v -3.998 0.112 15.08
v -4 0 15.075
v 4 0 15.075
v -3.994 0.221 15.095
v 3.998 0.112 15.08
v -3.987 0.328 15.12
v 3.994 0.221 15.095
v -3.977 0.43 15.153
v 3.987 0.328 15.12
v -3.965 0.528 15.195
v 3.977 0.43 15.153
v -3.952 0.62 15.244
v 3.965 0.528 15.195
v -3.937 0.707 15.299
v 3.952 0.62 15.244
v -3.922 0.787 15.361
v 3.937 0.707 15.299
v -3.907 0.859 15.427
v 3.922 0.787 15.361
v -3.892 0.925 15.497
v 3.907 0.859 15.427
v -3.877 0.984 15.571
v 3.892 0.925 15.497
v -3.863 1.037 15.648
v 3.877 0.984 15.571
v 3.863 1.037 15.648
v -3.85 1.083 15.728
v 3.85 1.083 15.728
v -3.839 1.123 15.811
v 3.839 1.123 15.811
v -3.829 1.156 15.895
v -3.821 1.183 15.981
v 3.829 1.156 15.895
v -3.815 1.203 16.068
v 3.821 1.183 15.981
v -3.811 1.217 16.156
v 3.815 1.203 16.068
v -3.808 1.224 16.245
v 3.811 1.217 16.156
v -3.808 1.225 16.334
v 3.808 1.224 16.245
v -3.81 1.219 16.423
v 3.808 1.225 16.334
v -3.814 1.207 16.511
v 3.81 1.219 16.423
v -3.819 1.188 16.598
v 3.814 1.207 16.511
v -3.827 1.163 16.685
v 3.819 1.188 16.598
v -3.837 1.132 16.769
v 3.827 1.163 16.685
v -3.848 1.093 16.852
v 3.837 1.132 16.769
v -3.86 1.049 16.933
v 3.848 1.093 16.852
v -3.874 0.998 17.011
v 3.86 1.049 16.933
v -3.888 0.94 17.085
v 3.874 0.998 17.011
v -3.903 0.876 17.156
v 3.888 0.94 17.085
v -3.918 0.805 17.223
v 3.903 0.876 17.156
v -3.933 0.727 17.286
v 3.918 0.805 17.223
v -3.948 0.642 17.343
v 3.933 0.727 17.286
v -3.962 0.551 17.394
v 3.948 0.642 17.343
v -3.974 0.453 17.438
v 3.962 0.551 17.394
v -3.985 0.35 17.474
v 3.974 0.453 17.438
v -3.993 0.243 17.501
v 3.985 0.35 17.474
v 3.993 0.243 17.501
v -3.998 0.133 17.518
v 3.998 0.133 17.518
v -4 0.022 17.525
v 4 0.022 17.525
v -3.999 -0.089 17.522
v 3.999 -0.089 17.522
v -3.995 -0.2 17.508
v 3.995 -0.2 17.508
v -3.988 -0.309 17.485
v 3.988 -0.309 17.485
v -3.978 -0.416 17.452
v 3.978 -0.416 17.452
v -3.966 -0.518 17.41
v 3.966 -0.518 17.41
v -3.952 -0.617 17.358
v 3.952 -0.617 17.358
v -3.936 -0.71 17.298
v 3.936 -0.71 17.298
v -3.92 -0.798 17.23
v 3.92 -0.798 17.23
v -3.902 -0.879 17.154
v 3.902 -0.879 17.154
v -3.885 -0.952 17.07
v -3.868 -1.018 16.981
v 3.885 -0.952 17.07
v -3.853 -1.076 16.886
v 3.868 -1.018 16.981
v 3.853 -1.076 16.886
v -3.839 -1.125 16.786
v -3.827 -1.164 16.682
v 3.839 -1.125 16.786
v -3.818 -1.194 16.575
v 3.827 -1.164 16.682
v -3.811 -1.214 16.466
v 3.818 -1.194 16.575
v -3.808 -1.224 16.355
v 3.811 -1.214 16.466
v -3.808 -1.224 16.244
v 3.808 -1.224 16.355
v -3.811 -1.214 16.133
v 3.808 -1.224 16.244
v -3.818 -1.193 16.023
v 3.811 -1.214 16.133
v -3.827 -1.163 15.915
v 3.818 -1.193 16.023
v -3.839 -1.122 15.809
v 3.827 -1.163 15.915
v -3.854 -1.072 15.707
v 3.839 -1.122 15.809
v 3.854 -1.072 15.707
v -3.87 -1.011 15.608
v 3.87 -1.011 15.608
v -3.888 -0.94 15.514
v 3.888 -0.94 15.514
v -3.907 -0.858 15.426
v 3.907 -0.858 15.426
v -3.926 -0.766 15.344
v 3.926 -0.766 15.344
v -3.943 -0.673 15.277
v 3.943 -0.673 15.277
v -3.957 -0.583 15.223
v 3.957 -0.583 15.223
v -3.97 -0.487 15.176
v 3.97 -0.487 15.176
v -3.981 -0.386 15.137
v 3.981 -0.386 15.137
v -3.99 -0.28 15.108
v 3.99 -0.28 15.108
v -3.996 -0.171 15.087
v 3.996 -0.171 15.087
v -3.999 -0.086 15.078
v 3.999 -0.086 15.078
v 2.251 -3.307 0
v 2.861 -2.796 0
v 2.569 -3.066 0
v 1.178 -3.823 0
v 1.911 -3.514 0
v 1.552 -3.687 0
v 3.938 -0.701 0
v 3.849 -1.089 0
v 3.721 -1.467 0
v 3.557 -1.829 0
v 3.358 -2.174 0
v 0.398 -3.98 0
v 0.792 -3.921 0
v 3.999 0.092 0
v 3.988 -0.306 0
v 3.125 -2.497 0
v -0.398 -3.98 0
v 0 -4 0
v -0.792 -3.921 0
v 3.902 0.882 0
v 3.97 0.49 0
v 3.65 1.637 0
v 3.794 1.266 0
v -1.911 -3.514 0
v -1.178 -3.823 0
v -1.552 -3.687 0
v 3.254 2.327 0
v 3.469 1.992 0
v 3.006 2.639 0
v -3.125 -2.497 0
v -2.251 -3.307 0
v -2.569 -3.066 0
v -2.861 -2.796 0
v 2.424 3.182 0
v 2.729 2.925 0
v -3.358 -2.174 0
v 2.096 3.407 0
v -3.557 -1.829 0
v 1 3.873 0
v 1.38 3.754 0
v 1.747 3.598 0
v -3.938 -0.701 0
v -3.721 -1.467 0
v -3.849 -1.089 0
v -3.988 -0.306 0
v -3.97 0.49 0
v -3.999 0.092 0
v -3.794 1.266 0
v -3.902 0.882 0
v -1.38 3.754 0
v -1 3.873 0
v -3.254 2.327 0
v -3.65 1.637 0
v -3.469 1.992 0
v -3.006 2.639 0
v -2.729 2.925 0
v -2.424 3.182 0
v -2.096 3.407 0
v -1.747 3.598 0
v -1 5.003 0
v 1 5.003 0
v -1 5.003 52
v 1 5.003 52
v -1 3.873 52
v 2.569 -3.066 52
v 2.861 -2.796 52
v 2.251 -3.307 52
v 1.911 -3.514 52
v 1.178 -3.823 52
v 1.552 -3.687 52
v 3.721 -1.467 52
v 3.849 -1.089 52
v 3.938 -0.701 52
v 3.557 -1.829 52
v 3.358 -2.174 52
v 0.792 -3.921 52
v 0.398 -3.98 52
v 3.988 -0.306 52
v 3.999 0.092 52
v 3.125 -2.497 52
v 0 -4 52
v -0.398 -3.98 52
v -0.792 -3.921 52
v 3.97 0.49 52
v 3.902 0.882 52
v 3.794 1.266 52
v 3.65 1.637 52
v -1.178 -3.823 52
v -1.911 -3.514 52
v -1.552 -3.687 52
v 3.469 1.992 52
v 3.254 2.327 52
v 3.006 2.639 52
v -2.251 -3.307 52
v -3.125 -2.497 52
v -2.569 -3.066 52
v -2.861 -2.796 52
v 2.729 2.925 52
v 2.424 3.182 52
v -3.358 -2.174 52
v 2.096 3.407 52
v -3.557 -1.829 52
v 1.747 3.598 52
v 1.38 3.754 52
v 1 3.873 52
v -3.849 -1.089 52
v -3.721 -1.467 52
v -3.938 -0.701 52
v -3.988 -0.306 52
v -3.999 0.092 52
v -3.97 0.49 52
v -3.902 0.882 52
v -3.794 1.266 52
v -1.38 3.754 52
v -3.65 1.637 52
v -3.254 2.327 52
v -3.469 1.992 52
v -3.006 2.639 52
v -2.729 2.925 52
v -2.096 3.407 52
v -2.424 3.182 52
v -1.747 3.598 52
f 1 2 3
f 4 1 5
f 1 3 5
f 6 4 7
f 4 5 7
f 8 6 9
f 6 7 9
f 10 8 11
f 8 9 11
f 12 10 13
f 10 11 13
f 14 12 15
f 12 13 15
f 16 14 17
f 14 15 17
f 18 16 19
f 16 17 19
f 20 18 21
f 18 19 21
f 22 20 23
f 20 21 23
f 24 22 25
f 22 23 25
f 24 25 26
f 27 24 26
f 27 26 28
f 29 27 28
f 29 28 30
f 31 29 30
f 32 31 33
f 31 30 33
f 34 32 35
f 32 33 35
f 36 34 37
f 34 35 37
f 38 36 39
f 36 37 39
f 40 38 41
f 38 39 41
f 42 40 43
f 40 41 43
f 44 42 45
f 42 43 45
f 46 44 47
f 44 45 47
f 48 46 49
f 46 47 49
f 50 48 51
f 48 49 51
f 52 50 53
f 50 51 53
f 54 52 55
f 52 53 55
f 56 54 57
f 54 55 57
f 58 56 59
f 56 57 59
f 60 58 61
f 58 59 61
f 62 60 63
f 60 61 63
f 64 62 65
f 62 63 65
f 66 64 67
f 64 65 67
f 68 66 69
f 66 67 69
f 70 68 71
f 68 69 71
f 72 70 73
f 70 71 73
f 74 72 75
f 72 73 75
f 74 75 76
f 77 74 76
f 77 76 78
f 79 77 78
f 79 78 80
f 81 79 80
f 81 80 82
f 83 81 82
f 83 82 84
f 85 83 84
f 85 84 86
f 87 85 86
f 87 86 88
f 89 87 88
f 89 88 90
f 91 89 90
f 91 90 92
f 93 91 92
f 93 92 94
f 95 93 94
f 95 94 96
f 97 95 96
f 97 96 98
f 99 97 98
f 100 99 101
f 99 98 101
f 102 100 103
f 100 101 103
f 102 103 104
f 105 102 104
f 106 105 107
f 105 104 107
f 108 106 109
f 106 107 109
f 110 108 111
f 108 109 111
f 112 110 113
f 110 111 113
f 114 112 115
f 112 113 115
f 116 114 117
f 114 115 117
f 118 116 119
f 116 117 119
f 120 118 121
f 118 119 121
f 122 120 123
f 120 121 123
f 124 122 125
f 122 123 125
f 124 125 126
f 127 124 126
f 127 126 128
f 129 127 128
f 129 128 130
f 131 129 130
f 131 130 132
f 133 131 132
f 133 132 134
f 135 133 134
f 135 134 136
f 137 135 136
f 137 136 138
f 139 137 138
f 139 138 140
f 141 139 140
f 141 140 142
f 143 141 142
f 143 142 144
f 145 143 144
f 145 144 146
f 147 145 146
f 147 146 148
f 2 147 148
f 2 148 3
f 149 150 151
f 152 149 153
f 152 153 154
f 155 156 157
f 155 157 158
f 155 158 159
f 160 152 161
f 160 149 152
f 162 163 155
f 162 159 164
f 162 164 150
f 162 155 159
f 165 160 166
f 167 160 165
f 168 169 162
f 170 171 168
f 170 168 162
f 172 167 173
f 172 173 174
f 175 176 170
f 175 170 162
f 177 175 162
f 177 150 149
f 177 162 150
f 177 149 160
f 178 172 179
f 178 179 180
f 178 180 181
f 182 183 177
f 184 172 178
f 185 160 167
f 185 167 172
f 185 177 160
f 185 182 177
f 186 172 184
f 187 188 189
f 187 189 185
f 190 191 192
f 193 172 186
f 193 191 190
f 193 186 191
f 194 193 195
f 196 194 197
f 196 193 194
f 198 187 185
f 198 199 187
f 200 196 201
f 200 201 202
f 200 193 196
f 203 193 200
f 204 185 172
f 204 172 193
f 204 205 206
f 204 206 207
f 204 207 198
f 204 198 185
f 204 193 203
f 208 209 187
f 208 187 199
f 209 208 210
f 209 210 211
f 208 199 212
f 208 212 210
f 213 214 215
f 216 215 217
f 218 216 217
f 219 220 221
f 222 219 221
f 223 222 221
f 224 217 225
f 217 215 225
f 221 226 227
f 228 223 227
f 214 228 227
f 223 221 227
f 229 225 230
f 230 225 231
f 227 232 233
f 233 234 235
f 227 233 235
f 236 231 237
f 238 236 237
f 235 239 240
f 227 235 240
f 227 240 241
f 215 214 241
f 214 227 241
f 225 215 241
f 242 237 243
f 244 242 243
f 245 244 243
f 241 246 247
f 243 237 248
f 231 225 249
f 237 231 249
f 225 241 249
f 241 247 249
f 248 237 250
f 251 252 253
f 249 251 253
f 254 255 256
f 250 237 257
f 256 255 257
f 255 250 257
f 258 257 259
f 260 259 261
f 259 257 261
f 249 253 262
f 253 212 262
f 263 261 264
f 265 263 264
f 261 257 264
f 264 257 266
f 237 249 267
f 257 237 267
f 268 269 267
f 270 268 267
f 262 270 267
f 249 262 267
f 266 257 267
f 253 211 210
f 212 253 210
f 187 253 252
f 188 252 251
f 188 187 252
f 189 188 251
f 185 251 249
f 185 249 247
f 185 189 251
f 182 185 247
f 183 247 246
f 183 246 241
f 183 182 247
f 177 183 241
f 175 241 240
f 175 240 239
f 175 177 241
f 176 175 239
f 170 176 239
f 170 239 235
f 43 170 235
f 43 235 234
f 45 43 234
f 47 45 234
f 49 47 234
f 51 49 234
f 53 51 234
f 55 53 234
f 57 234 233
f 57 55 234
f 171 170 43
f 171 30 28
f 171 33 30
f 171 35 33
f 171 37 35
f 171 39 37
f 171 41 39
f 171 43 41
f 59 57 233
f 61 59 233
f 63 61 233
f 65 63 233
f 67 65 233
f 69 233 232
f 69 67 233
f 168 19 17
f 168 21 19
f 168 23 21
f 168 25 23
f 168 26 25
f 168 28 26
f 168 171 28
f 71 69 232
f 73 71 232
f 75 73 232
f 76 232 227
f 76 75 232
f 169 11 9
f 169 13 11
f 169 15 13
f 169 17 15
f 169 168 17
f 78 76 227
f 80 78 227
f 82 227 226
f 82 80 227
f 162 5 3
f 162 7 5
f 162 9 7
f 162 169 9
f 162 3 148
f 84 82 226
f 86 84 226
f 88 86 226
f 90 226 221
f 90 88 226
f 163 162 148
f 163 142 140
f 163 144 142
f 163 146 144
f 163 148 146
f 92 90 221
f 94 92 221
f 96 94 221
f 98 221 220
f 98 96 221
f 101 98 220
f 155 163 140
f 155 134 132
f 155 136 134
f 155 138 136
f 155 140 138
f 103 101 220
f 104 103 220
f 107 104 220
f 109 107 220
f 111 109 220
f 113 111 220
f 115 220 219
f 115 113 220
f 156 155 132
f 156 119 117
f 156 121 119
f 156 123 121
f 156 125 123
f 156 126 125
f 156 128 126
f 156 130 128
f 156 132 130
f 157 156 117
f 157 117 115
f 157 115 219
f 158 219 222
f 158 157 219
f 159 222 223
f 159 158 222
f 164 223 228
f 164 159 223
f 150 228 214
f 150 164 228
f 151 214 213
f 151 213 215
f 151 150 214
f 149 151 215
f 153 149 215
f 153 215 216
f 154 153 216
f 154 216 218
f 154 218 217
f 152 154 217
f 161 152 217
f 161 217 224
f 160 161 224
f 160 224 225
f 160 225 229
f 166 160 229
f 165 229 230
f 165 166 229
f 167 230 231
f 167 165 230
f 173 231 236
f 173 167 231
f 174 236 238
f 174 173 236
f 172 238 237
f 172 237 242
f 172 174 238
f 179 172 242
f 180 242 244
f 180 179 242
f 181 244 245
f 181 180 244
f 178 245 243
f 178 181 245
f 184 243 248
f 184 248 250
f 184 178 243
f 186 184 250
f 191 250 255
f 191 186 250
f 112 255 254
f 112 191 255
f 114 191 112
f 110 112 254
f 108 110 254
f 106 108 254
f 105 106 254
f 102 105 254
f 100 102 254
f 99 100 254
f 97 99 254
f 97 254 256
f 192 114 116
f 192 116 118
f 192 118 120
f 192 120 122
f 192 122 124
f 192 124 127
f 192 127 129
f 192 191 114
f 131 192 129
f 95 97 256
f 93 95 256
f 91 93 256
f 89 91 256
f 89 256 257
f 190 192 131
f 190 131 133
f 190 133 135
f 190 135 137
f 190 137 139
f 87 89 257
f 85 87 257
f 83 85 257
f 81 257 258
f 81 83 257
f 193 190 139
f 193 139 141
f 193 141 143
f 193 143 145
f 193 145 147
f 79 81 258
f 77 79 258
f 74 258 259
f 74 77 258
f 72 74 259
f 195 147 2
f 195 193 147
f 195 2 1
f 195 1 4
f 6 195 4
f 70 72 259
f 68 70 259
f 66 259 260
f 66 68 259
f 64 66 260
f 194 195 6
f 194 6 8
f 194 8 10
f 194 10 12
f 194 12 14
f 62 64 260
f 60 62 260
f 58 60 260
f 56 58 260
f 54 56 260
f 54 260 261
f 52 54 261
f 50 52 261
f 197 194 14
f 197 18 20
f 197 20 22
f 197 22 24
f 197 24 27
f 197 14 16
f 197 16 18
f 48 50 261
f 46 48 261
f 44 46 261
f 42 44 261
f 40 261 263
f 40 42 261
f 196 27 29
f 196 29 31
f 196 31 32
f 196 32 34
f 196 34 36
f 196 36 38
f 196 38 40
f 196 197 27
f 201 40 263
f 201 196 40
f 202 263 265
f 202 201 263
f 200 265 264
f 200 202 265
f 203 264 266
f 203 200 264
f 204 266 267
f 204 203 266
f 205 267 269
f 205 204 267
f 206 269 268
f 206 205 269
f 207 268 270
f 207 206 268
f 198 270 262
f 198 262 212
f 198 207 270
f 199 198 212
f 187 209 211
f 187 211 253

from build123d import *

# Parameters (mm, degrees)
BOSS_EXTRUDE1_DEPTH = 52
SKETCH2_R           = 1.225
CUT_EXTRUDE1_DEPTH  = 25


with BuildPart() as part:
    # Sketch1 → Boss-Extrude1 (new body)
    with BuildSketch(Plane.XY):
        with BuildLine():
            Line((-1, 3.872983346), (-1, 5.002983346))
            Line((-1, 5.002983346), (1, 5.002983346))
            Line((1, 5.002983346), (1, 3.872983346))
            ThreePointArc((1, 3.872983346), (0, -4), (-1, 3.872983346))
        make_face()
    extrude(amount=BOSS_EXTRUDE1_DEPTH)

    # Sketch2 → Cut-Extrude1 (cut, symmetric)
    with BuildSketch(Plane(origin=(0, 0, 0), x_dir=(0, 0, -1), z_dir=(1, 0, 0))):
        with Locations((-16.3, 0)):
            Circle(SKETCH2_R)
    extrude(amount=CUT_EXTRUDE1_DEPTH, both=True, mode=Mode.SUBTRACT)


solid = part.part
